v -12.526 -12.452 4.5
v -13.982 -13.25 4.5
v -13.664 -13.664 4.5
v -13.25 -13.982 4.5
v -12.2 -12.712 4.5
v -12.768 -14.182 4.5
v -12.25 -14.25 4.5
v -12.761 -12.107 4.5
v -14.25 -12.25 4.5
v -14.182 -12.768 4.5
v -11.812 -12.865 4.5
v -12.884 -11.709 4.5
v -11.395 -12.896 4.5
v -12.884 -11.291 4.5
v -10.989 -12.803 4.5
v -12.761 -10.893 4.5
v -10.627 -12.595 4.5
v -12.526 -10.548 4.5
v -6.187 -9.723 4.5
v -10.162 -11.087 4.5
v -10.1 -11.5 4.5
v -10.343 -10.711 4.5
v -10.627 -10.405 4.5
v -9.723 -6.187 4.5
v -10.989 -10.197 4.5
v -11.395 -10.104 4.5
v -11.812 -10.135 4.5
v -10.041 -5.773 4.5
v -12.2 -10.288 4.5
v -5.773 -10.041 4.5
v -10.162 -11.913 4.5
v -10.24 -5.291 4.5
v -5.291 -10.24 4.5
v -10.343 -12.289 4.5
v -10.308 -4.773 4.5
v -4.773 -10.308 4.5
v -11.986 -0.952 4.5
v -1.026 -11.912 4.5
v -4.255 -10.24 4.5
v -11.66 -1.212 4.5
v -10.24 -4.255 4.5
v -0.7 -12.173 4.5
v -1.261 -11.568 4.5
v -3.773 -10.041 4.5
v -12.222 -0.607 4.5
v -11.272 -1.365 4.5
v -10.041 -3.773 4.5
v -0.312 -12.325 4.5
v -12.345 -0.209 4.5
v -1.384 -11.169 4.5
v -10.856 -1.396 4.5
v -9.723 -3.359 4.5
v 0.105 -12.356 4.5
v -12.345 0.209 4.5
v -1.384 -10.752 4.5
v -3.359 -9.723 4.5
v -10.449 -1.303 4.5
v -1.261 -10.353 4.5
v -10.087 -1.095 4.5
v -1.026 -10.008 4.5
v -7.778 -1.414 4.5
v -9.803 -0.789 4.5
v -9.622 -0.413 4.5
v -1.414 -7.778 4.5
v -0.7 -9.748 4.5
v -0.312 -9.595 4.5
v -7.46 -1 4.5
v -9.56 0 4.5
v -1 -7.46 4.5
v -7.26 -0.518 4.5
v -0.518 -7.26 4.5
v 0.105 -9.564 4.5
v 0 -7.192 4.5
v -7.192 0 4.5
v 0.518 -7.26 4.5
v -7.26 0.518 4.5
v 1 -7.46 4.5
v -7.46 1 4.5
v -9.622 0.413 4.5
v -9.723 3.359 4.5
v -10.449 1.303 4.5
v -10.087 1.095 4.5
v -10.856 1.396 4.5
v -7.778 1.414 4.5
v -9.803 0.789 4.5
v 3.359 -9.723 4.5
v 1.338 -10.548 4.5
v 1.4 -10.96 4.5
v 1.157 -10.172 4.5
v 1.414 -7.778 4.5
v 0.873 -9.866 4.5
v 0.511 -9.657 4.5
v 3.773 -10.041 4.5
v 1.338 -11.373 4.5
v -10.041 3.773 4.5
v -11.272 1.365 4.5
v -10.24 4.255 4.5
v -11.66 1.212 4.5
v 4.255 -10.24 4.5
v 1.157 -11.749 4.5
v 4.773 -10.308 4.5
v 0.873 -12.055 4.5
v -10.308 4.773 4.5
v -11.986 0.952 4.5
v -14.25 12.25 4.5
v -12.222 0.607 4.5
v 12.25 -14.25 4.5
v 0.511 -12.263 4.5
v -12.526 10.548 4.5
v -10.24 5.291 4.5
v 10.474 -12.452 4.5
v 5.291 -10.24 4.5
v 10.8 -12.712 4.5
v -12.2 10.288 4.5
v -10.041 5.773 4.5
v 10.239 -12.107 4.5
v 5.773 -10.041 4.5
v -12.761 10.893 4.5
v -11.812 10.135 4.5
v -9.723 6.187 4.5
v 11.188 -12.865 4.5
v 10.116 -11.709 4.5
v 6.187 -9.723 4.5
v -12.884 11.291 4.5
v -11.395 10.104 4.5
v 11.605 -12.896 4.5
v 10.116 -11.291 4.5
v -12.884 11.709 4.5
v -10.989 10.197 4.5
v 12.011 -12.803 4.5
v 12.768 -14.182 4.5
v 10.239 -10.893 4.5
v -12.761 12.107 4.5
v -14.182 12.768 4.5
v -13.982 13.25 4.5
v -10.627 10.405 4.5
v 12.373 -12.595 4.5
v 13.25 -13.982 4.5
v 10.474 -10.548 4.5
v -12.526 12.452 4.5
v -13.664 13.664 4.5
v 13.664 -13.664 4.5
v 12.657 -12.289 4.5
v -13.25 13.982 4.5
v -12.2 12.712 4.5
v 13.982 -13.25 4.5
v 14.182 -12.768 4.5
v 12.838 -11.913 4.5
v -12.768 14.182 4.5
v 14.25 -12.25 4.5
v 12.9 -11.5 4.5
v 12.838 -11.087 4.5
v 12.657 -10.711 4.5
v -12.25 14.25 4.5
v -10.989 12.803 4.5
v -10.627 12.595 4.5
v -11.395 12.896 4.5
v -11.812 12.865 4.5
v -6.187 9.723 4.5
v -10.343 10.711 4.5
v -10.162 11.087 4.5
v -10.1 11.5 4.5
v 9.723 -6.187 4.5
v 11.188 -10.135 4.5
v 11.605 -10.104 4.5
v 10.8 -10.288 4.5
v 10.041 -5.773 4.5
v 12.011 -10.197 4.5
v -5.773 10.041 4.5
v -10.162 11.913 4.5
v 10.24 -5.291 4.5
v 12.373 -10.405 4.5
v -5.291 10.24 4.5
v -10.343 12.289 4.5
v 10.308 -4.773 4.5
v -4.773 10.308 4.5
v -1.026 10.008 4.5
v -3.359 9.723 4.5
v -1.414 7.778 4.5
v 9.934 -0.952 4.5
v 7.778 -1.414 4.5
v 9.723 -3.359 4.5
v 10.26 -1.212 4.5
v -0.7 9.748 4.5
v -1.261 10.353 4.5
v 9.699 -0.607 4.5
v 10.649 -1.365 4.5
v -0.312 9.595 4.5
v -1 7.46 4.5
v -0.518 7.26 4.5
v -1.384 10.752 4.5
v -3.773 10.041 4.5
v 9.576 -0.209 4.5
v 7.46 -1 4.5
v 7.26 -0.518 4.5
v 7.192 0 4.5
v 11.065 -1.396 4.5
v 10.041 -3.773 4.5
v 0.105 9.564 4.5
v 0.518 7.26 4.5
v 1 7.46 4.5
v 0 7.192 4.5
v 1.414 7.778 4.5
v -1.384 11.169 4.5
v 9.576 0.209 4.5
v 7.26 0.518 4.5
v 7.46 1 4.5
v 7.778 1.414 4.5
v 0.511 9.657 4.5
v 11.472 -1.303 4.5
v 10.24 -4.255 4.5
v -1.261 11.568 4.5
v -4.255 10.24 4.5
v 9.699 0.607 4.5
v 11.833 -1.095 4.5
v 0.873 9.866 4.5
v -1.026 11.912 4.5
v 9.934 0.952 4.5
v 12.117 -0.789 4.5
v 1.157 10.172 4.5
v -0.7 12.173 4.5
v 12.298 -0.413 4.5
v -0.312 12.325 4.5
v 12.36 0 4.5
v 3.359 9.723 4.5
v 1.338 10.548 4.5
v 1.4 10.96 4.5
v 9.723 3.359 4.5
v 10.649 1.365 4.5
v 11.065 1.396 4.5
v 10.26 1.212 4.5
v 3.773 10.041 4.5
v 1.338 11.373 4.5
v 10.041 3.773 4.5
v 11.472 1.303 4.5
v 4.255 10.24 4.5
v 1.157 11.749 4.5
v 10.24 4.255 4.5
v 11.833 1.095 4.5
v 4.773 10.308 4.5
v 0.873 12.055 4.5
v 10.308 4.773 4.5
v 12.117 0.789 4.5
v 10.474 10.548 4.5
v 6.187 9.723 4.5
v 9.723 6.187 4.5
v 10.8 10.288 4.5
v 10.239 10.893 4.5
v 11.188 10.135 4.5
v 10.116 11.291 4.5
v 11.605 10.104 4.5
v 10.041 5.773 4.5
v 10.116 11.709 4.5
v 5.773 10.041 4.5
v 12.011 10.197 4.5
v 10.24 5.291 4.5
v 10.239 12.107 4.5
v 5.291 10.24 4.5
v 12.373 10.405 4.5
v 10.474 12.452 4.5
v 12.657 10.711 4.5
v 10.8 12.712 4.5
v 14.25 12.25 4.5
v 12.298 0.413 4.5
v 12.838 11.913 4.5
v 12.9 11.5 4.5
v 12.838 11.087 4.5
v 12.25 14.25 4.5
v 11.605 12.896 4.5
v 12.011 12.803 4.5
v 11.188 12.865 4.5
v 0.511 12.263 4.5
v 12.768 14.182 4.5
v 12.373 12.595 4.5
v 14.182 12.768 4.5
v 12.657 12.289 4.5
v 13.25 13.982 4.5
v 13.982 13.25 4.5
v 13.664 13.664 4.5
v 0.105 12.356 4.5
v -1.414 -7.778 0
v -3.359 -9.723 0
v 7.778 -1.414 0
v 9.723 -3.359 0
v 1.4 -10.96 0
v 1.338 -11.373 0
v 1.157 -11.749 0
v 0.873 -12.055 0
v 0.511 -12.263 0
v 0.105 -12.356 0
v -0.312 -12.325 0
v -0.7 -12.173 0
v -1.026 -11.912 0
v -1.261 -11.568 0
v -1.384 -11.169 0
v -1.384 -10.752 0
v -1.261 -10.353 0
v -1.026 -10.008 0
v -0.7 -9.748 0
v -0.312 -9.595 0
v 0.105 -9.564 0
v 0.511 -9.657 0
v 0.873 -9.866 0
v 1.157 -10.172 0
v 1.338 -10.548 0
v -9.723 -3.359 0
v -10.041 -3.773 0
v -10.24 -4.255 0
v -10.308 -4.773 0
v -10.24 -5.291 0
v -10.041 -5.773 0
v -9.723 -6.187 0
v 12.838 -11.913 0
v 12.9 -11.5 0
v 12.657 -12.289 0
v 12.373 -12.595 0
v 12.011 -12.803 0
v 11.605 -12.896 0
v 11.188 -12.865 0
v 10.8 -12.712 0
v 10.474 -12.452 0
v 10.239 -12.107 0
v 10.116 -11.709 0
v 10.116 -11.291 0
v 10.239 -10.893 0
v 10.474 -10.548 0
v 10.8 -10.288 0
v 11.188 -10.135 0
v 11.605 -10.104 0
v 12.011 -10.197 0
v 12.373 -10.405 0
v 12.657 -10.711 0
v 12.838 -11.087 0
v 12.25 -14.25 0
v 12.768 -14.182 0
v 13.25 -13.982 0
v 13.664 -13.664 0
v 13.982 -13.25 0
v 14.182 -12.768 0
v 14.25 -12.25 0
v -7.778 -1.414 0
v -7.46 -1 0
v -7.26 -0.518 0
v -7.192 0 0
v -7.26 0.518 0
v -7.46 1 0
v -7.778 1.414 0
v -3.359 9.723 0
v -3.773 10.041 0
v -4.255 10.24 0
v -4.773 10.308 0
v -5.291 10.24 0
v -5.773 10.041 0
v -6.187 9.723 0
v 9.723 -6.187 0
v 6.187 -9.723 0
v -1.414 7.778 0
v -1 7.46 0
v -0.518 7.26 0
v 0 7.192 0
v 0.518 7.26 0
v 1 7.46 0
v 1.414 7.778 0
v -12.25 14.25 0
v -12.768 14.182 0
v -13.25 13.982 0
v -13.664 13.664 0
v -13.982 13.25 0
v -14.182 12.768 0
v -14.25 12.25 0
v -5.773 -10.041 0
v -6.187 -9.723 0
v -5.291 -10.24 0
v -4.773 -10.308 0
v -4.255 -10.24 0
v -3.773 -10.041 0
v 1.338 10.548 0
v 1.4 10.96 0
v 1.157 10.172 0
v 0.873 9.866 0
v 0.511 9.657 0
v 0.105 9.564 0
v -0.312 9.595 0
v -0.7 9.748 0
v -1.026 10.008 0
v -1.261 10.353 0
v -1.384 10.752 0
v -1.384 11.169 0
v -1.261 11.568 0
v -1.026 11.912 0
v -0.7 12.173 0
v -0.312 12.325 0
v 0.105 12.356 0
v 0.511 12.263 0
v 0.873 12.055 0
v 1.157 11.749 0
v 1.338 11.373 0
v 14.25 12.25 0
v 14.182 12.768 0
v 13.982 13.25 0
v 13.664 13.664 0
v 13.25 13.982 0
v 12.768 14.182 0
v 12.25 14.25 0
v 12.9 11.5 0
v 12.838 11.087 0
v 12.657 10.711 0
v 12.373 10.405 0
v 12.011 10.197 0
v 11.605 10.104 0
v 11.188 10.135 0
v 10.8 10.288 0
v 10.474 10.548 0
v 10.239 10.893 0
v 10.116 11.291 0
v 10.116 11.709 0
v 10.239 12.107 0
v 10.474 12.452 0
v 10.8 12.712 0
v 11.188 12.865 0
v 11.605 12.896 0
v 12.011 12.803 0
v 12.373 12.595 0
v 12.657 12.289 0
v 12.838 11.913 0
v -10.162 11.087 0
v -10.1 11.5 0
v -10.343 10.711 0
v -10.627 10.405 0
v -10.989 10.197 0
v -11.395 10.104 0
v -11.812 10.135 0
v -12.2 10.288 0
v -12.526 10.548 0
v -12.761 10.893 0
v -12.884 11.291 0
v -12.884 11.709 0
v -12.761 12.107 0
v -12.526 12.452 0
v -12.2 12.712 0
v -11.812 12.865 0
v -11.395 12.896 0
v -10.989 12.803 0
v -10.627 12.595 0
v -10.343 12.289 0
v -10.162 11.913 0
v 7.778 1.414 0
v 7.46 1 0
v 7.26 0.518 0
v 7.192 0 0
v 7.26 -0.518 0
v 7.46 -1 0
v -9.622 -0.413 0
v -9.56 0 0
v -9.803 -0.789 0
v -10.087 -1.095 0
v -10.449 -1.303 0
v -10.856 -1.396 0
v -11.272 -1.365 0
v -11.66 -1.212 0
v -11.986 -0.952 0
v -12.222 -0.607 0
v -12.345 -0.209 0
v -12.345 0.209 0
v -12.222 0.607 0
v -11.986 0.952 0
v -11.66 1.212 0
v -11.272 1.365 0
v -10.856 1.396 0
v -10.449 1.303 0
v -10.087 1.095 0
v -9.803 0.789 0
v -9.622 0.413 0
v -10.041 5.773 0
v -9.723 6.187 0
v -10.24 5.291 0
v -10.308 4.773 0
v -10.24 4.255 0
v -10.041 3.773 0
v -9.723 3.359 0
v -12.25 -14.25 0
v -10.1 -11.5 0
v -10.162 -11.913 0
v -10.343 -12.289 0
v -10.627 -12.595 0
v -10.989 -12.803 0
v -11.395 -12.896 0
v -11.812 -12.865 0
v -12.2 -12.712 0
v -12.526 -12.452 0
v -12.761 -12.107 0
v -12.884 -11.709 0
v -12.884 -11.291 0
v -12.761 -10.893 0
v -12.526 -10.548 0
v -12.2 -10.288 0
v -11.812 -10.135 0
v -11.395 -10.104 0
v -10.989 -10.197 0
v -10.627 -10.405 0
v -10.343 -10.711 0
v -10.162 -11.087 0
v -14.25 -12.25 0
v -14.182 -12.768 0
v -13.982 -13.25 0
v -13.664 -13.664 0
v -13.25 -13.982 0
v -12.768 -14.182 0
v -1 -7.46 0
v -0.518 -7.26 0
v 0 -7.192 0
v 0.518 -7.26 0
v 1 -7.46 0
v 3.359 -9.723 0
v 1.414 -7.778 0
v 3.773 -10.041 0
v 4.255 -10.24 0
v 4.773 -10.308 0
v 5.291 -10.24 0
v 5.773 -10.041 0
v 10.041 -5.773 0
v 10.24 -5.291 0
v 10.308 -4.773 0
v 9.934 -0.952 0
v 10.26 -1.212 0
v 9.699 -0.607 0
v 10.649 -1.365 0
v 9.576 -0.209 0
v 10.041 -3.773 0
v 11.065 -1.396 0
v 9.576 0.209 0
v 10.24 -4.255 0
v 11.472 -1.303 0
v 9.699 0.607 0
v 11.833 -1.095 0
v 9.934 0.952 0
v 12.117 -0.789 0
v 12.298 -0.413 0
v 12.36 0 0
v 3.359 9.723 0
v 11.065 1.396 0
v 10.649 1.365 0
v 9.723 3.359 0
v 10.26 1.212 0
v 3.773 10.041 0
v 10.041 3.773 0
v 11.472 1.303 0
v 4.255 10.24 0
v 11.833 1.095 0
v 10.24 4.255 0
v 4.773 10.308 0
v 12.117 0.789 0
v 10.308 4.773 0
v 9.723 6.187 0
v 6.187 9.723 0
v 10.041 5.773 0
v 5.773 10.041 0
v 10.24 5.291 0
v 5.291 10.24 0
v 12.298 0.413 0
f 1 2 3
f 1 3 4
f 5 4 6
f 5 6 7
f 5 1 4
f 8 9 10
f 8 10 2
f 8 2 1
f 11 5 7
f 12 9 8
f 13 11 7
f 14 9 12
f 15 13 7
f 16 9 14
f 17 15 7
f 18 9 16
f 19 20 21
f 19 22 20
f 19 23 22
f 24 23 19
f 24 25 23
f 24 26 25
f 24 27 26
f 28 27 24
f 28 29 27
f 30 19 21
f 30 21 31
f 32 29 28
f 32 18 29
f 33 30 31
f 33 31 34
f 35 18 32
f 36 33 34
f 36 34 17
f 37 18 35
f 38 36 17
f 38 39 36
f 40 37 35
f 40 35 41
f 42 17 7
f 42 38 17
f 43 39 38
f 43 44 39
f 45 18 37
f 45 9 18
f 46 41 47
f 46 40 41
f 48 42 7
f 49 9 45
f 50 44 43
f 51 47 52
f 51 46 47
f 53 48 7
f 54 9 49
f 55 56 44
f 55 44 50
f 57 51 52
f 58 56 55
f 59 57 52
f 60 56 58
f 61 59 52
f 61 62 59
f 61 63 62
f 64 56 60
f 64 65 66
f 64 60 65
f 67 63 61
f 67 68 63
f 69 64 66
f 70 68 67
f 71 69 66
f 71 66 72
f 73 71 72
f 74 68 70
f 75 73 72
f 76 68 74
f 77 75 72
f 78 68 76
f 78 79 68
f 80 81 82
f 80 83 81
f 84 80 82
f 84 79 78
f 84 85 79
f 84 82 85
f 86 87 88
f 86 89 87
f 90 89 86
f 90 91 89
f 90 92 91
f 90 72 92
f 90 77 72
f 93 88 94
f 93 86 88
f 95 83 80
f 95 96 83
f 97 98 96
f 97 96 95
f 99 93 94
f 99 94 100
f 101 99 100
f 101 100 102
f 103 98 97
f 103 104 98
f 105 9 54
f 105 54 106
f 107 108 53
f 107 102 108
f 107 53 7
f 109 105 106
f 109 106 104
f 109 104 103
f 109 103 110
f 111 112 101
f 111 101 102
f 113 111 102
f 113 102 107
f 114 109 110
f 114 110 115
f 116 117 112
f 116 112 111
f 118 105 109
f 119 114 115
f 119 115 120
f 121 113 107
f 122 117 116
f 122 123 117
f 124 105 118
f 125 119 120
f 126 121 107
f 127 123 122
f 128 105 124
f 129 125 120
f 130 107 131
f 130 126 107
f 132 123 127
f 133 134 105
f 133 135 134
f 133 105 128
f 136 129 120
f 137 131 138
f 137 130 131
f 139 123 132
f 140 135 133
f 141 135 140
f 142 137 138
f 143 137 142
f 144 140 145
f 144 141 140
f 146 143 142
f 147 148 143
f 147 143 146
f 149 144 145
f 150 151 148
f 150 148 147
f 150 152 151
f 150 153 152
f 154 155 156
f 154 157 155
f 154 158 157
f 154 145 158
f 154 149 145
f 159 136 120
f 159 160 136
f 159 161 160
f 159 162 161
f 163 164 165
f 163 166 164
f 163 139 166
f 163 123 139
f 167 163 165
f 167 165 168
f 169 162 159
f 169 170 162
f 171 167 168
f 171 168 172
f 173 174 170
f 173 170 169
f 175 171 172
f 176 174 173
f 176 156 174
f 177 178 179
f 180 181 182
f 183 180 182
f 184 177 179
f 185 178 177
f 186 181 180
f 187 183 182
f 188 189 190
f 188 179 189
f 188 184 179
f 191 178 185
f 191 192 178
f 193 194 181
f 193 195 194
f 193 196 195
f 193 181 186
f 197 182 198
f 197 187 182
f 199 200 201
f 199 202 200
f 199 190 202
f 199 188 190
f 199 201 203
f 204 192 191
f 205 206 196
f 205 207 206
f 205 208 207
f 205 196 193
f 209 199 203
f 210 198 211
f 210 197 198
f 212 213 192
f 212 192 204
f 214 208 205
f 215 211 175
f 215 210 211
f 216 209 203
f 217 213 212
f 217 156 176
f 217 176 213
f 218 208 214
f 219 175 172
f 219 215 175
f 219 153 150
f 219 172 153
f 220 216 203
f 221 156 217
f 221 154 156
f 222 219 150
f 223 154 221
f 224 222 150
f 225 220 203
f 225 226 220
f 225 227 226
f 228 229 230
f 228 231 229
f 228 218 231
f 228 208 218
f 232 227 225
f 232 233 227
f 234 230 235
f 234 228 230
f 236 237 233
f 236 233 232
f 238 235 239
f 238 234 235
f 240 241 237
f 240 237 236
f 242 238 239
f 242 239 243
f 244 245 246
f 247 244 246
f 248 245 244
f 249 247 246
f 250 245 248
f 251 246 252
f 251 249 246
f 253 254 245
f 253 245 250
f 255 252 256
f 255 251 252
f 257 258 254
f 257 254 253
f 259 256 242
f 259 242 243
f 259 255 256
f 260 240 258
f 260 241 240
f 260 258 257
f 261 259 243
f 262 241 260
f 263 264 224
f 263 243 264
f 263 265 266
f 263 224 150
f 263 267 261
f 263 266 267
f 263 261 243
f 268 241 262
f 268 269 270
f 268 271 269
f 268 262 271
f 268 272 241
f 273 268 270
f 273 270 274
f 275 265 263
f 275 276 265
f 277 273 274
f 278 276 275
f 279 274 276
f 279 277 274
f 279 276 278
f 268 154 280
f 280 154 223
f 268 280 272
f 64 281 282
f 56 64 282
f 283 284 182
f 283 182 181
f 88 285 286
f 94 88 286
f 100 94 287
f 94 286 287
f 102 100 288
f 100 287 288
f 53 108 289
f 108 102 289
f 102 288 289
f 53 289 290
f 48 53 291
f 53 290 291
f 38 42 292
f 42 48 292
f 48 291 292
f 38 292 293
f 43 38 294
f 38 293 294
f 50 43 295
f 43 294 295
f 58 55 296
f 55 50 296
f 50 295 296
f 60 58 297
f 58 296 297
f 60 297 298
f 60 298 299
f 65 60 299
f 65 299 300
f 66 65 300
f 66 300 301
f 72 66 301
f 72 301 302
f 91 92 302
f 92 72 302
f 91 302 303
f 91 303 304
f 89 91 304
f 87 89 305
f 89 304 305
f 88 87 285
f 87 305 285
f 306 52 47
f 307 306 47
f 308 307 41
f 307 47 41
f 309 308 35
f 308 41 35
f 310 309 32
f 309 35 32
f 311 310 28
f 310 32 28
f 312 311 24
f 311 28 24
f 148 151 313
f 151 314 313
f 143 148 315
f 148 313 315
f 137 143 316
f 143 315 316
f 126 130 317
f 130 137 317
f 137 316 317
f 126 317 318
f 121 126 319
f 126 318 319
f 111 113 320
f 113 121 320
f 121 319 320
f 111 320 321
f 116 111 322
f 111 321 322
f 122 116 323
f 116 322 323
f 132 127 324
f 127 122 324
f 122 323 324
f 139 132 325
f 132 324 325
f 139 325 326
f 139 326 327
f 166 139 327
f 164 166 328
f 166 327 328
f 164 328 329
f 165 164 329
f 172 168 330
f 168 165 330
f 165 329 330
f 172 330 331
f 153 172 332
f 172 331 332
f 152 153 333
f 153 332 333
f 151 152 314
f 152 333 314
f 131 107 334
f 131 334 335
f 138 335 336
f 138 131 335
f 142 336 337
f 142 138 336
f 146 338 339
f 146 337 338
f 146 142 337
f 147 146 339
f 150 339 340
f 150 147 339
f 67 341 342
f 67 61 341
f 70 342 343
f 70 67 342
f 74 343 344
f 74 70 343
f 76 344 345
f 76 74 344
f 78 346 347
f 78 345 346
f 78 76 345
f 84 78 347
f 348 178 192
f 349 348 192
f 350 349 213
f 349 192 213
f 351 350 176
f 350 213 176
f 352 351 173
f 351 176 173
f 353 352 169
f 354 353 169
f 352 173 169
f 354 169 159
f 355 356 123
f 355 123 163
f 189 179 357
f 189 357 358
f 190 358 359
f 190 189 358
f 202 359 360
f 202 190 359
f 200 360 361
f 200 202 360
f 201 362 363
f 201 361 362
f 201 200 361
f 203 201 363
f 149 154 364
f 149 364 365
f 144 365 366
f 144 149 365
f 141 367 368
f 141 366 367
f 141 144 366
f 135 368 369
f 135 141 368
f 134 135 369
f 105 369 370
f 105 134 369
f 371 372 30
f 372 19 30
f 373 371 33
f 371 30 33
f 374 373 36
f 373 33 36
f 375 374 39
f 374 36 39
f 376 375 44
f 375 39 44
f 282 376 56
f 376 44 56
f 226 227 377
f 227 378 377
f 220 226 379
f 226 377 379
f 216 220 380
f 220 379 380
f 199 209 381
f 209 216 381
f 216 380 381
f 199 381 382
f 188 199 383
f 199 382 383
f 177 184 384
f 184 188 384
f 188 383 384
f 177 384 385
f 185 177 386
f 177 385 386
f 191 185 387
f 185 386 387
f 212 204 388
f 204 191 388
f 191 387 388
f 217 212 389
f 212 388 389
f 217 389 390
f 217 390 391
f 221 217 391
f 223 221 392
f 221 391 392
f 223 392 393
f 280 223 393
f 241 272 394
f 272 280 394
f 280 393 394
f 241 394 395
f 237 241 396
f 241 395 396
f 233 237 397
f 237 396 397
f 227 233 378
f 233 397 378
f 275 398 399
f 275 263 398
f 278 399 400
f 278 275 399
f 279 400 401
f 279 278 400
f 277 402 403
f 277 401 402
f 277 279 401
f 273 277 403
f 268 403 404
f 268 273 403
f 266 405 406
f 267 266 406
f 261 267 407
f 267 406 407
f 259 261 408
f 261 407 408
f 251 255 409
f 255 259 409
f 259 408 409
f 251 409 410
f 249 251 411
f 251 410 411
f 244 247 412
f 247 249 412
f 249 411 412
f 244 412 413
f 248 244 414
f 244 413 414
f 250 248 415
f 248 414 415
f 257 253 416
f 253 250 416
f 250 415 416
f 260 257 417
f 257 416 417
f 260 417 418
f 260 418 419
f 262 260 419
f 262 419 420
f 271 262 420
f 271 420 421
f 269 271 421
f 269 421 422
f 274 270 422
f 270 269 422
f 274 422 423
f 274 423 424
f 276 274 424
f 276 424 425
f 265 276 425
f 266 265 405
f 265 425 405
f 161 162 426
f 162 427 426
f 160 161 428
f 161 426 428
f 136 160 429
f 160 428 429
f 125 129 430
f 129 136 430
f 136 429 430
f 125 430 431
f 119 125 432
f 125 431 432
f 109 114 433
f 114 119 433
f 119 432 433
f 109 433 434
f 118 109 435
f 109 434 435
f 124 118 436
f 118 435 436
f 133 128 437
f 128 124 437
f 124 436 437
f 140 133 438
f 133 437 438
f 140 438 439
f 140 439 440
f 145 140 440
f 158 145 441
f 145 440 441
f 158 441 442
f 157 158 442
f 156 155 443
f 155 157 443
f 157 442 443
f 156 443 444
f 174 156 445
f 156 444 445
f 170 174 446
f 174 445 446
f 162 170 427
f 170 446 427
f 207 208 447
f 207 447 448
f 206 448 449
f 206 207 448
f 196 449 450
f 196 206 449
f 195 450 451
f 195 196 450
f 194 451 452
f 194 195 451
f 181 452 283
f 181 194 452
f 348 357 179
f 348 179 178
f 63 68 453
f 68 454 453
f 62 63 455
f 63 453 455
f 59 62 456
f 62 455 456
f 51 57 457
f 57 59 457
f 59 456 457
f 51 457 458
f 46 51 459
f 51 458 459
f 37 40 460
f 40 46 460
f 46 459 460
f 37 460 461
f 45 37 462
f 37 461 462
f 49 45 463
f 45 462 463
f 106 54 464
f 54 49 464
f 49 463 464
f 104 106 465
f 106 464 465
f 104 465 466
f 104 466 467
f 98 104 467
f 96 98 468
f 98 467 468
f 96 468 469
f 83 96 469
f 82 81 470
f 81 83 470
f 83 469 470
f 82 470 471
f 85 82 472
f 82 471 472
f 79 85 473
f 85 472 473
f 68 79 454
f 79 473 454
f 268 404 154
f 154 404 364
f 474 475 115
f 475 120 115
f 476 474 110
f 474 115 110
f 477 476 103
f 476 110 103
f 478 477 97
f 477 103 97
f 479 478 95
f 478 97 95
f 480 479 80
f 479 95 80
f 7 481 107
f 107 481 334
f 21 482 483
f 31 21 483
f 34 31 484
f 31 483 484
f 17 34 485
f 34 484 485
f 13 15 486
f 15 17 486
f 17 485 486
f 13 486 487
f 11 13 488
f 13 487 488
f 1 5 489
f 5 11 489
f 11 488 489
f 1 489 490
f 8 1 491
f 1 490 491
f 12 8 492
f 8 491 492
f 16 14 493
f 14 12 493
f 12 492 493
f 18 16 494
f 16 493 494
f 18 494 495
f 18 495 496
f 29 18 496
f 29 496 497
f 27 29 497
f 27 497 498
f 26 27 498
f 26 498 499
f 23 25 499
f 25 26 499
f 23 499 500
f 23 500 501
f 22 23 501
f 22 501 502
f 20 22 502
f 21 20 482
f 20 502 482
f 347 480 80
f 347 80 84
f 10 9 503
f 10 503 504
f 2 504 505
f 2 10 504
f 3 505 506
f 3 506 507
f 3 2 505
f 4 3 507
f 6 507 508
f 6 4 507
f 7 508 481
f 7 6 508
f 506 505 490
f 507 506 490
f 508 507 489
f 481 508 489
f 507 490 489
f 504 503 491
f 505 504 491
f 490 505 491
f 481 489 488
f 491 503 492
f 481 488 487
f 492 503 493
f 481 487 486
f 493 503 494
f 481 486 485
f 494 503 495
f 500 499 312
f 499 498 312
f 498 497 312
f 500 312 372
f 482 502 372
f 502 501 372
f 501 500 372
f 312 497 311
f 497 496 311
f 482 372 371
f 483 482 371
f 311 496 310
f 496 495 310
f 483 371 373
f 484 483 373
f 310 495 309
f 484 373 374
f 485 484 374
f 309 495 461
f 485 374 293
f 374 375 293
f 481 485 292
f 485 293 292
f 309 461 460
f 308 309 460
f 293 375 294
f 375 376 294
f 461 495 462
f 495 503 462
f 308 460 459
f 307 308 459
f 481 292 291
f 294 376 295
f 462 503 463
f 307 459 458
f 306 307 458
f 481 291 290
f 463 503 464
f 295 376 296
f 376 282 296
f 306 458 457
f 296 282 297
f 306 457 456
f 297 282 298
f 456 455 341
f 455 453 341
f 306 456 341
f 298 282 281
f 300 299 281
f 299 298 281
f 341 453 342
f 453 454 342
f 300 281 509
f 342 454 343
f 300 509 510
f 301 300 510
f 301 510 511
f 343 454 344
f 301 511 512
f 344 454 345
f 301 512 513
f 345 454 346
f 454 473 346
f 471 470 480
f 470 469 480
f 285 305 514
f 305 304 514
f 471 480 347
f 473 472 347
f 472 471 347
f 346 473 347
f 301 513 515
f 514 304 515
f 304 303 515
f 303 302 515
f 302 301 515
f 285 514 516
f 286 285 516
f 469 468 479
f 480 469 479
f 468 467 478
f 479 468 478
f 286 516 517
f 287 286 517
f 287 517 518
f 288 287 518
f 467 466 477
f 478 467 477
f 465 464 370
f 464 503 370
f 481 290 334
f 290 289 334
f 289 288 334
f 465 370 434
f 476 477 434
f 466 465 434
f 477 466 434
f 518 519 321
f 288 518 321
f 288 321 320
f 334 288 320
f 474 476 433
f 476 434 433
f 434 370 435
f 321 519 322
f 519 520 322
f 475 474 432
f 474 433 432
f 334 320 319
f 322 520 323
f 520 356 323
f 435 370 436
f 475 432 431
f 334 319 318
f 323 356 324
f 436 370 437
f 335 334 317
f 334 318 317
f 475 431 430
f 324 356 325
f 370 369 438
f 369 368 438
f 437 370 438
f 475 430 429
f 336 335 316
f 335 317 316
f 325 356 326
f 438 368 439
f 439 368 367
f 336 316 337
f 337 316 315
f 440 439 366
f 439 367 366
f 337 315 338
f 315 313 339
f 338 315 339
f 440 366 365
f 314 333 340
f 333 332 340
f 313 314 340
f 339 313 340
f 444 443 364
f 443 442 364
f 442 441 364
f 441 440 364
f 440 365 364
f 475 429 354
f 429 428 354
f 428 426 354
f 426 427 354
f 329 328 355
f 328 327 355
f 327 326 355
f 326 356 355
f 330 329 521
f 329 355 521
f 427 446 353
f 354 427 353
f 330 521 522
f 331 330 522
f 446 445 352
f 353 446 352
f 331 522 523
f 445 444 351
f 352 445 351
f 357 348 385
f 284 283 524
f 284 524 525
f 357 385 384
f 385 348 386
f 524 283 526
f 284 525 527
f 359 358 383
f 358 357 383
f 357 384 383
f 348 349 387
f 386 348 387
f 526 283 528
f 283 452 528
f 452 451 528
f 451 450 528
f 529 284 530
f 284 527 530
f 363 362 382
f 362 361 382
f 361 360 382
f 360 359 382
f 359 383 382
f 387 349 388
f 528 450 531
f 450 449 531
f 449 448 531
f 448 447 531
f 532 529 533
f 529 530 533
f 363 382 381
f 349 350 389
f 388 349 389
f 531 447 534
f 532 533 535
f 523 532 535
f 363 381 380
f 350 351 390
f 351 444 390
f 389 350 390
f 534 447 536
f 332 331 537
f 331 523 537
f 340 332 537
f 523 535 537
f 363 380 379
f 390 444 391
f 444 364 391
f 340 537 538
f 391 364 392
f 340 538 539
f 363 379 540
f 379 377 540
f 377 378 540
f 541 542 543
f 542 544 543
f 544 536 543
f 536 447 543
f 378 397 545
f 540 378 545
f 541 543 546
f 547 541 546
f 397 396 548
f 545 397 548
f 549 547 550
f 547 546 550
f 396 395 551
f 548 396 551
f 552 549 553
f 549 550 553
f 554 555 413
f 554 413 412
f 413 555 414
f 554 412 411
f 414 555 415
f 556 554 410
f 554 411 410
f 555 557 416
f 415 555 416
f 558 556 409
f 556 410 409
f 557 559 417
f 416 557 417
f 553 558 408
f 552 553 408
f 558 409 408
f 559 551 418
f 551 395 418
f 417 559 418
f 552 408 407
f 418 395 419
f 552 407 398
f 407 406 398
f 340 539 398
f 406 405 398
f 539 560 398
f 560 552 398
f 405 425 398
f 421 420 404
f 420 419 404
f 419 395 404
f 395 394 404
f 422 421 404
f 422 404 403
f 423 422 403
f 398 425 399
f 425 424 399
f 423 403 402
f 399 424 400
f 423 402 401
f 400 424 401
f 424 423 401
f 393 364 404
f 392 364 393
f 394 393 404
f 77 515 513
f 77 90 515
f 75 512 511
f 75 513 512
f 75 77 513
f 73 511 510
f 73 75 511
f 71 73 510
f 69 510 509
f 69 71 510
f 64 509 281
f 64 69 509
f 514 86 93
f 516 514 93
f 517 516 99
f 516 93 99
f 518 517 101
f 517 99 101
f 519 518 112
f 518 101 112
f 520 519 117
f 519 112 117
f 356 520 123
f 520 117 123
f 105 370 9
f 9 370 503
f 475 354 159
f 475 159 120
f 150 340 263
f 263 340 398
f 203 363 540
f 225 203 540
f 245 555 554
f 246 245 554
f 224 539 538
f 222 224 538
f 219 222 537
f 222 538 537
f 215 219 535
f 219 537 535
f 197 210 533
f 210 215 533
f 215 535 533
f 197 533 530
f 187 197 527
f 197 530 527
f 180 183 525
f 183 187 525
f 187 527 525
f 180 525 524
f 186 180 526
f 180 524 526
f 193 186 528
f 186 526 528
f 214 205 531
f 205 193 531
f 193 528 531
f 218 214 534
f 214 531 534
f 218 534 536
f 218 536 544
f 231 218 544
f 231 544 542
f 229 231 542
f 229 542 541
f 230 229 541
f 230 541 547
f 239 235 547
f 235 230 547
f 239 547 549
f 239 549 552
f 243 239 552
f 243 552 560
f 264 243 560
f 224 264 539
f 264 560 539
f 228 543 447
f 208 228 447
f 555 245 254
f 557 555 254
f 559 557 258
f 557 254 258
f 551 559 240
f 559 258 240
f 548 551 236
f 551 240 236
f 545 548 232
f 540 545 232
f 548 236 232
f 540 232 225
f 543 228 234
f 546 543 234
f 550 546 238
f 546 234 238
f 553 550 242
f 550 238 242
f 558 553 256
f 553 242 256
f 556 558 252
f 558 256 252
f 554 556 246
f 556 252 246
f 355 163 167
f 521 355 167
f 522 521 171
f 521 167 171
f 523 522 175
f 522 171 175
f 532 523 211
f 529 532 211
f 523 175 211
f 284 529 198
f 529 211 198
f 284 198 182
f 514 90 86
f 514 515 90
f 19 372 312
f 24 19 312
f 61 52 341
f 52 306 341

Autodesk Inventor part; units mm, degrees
ref_plane "YZ Plane" through (0, 0, 0) normal (1, 0, 0) x (0, 1, 0)
ref_plane "XZ Plane" through (0, 0, 0) normal (0, 1, 0) x (-1, 0, 0)
ref_plane "XY Plane" through (0, 0, 0) normal (0, 0, 1) x (1, 0, 0)
sketch "Skizze5" plane through (0, 0, 0) normal (0, 0, 1) x (1, 0, 0)
  line L0 (-8.1928, -13.75) -> (8.1928, -13.75) projected
  arc A0 (13.75, -8.1928) -> (8.1928, -13.75) centre (11.5, -11.5) ccw projected
  line L1 (13.75, -8.1928) -> (13.75, 8.1928) projected
  arc A1 (8.1928, 13.75) -> (13.75, 8.1928) centre (11.5, 11.5) ccw projected
  line L2 (8.1928, 13.75) -> (-8.1928, 13.75) projected
  arc A2 (-13.75, 8.1928) -> (-8.1928, 13.75) centre (-11.5, 11.5) ccw projected
  line L3 (-13.75, 8.1928) -> (-13.75, -8.1928) projected
  arc A3 (-8.1928, -13.75) -> (-13.75, -8.1928) centre (-11.5, -11.5) ccw projected
  circle A4 centre (0, 0) radius 4 projected
  circle A5 centre (0, 0) radius 2.2643 construction
  circle A6 centre (0, 10.9602) radius 2 construction
  circle A7 centre (0, -10.9602) radius 2 construction
  circle A8 centre (10.9602, 0) radius 2 construction
  circle A9 centre (-10.9602, 0) radius 2 construction
  line L4 (13.0815, -2.8284) -> (2.8284, -13.0815) construction
  arc A10 (13.0815, -2.8284) -> (13.0815, 2.8284) centre (10.253, 0) ccw construction
  line L5 (2.8284, 13.0815) -> (13.0815, 2.8284) construction
  arc A11 (2.8284, 13.0815) -> (-2.8284, 13.0815) centre (0, 10.253) ccw construction
  line L6 (-13.0815, 2.8284) -> (-2.8284, 13.0815) construction
  arc A12 (-13.0815, 2.8284) -> (-13.0815, -2.8284) centre (-10.253, 0) ccw construction
  line L7 (-2.8284, -13.0815) -> (-13.0815, -2.8284) construction
  arc A13 (-2.8284, -13.0815) -> (2.8284, -13.0815) centre (0, -10.253) ccw construction
  arc A14 (14.25, 12.25) -> (12.25, 14.25) centre (12.25, 12.25) ccw construction
  arc A15 (-14.25, -12.25) -> (-12.25, -14.25) centre (-12.25, -12.25) ccw construction
  line L8 (-14.25, -14.25) -> (14.25, -14.25)
  line L9 (14.25, -14.25) -> (14.25, 14.25)
  line L10 (14.25, 14.25) -> (-14.25, 14.25)
  line L11 (-14.25, 14.25) -> (-14.25, -14.25)
  line L12 (-14.25, -14.25) -> (14.25, 14.25) construction
  line L13 (14.25, -14.25) -> (-14.25, 14.25) construction
  circle A16 centre (10.9602, 0) radius 1.4
  circle A17 centre (0, 10.9602) radius 1.4
  circle A18 centre (0, -10.9602) radius 1.4
  circle A19 centre (-10.9602, 0) radius 1.4
  line L14 (-11.1369, 4.773) -> (4.773, -11.1369)
  line L15 (4.773, -11.1369) -> (11.1369, -4.773)
  line L16 (11.1369, -4.773) -> (-4.773, 11.1369)
  line L17 (-4.773, 11.1369) -> (-11.1369, 4.773)
  line L18 (-11.1369, 4.773) -> (11.1369, -4.773) construction
  line L19 (4.773, -11.1369) -> (-4.773, 11.1369) construction
  line L20 (11.1369, 4.773) -> (-4.773, -11.1369)
  line L21 (-4.773, -11.1369) -> (-11.1369, -4.773)
  line L22 (-11.1369, -4.773) -> (4.773, 11.1369)
  line L23 (4.773, 11.1369) -> (11.1369, 4.773)
  line L24 (11.1369, 4.773) -> (-11.1369, -4.773) construction
  line L25 (-4.773, -11.1369) -> (4.773, 11.1369) construction
  circle A20 centre (11.5, 11.5) radius 1.4 projected
  circle A21 centre (11.5, -11.5) radius 1.4 projected
  circle A22 centre (-11.5, -11.5) radius 1.4 projected
  circle A23 centre (-11.5, 11.5) radius 1.4 projected
  point P0 (0, 0)
  point P1 (0, -6.364)
  point P2 (-6.364, 0)
  point P3 (0, 6.364)
  point P4 (6.364, 0)
  dimension "d13" = 2.8
  dimension "d14" = 2.8
  dimension "d15" = 2.8
  dimension "d16" = 2.8
  dimension "d17" = 9
  dimension "d18" = 9
extrude "Extrusion4" add sketch "Skizze5" along normal blind 4.5 contours A3 L3 A2 L2 A1 L1 A0 L0 | L11 L10 L9 L8
fillet "Rundung2" radius 2 16 edges at (14.25, 14.25, 2.25) (14.25, -14.25, 2.25) (-14.25, -14.25, 2.25) (-14.25, 14.25, 2.25) (0, 6.364, 2.25) (4.773, 11.1369, 2.25) (-4.773, 11.1369, 2.25) (-11.1369, 4.773, 2.25) (-6.364, 0, 2.25) (-11.1369, -4.773, 2.25) (-4.773, -11.1369, 2.25) (0, -6.364, 2.25) (4.773, -11.1369, 2.25) (11.1369, -4.773, 2.25) (6.364, 0, 2.25) (11.1369, 4.773, 2.25)
sketch "Skizze6" plane through (0, 0, 0) normal (0, 0, -1) x (-1, 0, 0)
  line L0 (-14.25, -12.25) -> (-14.25, -8.1928) projected
  arc A0 (-14.25, -8.1928) -> (-13.4687, -8.6062) centre (-13.75, -8.1928) ccw projected
  arc A1 (-8.6062, -13.4688) -> (-13.4687, -8.6062) centre (-11.5, -11.5) ccw projected
  arc A2 (-8.6062, -13.4688) -> (-8.1928, -14.25) centre (-8.1928, -13.75) ccw projected
  line L1 (-8.1928, -14.25) -> (-12.25, -14.25) projected
  arc A3 (-14.25, -12.25) -> (-12.25, -14.25) centre (-12.25, -12.25) ccw projected
  circle A4 centre (-11.5, -11.5) radius 1.4 projected
  line L2 (8.1928, 14.25) -> (12.25, 14.25) projected
  arc A5 (14.25, 12.25) -> (12.25, 14.25) centre (12.25, 12.25) ccw projected
  line L3 (14.25, 12.25) -> (14.25, 8.1928) projected
  arc A6 (14.25, 8.1928) -> (13.4688, 8.6062) centre (13.75, 8.1928) ccw projected
  arc A7 (8.6062, 13.4688) -> (13.4688, 8.6062) centre (11.5, 11.5) ccw projected
  arc A8 (8.6062, 13.4688) -> (8.1928, 14.25) centre (8.1928, 13.75) ccw projected
  circle A9 centre (11.5, 11.5) radius 1.4 projected
  point P0 (0, 0)
extrude "Extrusion5" [suppressed]
properties part number "30_Adapter_AS5600_rotational_enocder_nema12"
